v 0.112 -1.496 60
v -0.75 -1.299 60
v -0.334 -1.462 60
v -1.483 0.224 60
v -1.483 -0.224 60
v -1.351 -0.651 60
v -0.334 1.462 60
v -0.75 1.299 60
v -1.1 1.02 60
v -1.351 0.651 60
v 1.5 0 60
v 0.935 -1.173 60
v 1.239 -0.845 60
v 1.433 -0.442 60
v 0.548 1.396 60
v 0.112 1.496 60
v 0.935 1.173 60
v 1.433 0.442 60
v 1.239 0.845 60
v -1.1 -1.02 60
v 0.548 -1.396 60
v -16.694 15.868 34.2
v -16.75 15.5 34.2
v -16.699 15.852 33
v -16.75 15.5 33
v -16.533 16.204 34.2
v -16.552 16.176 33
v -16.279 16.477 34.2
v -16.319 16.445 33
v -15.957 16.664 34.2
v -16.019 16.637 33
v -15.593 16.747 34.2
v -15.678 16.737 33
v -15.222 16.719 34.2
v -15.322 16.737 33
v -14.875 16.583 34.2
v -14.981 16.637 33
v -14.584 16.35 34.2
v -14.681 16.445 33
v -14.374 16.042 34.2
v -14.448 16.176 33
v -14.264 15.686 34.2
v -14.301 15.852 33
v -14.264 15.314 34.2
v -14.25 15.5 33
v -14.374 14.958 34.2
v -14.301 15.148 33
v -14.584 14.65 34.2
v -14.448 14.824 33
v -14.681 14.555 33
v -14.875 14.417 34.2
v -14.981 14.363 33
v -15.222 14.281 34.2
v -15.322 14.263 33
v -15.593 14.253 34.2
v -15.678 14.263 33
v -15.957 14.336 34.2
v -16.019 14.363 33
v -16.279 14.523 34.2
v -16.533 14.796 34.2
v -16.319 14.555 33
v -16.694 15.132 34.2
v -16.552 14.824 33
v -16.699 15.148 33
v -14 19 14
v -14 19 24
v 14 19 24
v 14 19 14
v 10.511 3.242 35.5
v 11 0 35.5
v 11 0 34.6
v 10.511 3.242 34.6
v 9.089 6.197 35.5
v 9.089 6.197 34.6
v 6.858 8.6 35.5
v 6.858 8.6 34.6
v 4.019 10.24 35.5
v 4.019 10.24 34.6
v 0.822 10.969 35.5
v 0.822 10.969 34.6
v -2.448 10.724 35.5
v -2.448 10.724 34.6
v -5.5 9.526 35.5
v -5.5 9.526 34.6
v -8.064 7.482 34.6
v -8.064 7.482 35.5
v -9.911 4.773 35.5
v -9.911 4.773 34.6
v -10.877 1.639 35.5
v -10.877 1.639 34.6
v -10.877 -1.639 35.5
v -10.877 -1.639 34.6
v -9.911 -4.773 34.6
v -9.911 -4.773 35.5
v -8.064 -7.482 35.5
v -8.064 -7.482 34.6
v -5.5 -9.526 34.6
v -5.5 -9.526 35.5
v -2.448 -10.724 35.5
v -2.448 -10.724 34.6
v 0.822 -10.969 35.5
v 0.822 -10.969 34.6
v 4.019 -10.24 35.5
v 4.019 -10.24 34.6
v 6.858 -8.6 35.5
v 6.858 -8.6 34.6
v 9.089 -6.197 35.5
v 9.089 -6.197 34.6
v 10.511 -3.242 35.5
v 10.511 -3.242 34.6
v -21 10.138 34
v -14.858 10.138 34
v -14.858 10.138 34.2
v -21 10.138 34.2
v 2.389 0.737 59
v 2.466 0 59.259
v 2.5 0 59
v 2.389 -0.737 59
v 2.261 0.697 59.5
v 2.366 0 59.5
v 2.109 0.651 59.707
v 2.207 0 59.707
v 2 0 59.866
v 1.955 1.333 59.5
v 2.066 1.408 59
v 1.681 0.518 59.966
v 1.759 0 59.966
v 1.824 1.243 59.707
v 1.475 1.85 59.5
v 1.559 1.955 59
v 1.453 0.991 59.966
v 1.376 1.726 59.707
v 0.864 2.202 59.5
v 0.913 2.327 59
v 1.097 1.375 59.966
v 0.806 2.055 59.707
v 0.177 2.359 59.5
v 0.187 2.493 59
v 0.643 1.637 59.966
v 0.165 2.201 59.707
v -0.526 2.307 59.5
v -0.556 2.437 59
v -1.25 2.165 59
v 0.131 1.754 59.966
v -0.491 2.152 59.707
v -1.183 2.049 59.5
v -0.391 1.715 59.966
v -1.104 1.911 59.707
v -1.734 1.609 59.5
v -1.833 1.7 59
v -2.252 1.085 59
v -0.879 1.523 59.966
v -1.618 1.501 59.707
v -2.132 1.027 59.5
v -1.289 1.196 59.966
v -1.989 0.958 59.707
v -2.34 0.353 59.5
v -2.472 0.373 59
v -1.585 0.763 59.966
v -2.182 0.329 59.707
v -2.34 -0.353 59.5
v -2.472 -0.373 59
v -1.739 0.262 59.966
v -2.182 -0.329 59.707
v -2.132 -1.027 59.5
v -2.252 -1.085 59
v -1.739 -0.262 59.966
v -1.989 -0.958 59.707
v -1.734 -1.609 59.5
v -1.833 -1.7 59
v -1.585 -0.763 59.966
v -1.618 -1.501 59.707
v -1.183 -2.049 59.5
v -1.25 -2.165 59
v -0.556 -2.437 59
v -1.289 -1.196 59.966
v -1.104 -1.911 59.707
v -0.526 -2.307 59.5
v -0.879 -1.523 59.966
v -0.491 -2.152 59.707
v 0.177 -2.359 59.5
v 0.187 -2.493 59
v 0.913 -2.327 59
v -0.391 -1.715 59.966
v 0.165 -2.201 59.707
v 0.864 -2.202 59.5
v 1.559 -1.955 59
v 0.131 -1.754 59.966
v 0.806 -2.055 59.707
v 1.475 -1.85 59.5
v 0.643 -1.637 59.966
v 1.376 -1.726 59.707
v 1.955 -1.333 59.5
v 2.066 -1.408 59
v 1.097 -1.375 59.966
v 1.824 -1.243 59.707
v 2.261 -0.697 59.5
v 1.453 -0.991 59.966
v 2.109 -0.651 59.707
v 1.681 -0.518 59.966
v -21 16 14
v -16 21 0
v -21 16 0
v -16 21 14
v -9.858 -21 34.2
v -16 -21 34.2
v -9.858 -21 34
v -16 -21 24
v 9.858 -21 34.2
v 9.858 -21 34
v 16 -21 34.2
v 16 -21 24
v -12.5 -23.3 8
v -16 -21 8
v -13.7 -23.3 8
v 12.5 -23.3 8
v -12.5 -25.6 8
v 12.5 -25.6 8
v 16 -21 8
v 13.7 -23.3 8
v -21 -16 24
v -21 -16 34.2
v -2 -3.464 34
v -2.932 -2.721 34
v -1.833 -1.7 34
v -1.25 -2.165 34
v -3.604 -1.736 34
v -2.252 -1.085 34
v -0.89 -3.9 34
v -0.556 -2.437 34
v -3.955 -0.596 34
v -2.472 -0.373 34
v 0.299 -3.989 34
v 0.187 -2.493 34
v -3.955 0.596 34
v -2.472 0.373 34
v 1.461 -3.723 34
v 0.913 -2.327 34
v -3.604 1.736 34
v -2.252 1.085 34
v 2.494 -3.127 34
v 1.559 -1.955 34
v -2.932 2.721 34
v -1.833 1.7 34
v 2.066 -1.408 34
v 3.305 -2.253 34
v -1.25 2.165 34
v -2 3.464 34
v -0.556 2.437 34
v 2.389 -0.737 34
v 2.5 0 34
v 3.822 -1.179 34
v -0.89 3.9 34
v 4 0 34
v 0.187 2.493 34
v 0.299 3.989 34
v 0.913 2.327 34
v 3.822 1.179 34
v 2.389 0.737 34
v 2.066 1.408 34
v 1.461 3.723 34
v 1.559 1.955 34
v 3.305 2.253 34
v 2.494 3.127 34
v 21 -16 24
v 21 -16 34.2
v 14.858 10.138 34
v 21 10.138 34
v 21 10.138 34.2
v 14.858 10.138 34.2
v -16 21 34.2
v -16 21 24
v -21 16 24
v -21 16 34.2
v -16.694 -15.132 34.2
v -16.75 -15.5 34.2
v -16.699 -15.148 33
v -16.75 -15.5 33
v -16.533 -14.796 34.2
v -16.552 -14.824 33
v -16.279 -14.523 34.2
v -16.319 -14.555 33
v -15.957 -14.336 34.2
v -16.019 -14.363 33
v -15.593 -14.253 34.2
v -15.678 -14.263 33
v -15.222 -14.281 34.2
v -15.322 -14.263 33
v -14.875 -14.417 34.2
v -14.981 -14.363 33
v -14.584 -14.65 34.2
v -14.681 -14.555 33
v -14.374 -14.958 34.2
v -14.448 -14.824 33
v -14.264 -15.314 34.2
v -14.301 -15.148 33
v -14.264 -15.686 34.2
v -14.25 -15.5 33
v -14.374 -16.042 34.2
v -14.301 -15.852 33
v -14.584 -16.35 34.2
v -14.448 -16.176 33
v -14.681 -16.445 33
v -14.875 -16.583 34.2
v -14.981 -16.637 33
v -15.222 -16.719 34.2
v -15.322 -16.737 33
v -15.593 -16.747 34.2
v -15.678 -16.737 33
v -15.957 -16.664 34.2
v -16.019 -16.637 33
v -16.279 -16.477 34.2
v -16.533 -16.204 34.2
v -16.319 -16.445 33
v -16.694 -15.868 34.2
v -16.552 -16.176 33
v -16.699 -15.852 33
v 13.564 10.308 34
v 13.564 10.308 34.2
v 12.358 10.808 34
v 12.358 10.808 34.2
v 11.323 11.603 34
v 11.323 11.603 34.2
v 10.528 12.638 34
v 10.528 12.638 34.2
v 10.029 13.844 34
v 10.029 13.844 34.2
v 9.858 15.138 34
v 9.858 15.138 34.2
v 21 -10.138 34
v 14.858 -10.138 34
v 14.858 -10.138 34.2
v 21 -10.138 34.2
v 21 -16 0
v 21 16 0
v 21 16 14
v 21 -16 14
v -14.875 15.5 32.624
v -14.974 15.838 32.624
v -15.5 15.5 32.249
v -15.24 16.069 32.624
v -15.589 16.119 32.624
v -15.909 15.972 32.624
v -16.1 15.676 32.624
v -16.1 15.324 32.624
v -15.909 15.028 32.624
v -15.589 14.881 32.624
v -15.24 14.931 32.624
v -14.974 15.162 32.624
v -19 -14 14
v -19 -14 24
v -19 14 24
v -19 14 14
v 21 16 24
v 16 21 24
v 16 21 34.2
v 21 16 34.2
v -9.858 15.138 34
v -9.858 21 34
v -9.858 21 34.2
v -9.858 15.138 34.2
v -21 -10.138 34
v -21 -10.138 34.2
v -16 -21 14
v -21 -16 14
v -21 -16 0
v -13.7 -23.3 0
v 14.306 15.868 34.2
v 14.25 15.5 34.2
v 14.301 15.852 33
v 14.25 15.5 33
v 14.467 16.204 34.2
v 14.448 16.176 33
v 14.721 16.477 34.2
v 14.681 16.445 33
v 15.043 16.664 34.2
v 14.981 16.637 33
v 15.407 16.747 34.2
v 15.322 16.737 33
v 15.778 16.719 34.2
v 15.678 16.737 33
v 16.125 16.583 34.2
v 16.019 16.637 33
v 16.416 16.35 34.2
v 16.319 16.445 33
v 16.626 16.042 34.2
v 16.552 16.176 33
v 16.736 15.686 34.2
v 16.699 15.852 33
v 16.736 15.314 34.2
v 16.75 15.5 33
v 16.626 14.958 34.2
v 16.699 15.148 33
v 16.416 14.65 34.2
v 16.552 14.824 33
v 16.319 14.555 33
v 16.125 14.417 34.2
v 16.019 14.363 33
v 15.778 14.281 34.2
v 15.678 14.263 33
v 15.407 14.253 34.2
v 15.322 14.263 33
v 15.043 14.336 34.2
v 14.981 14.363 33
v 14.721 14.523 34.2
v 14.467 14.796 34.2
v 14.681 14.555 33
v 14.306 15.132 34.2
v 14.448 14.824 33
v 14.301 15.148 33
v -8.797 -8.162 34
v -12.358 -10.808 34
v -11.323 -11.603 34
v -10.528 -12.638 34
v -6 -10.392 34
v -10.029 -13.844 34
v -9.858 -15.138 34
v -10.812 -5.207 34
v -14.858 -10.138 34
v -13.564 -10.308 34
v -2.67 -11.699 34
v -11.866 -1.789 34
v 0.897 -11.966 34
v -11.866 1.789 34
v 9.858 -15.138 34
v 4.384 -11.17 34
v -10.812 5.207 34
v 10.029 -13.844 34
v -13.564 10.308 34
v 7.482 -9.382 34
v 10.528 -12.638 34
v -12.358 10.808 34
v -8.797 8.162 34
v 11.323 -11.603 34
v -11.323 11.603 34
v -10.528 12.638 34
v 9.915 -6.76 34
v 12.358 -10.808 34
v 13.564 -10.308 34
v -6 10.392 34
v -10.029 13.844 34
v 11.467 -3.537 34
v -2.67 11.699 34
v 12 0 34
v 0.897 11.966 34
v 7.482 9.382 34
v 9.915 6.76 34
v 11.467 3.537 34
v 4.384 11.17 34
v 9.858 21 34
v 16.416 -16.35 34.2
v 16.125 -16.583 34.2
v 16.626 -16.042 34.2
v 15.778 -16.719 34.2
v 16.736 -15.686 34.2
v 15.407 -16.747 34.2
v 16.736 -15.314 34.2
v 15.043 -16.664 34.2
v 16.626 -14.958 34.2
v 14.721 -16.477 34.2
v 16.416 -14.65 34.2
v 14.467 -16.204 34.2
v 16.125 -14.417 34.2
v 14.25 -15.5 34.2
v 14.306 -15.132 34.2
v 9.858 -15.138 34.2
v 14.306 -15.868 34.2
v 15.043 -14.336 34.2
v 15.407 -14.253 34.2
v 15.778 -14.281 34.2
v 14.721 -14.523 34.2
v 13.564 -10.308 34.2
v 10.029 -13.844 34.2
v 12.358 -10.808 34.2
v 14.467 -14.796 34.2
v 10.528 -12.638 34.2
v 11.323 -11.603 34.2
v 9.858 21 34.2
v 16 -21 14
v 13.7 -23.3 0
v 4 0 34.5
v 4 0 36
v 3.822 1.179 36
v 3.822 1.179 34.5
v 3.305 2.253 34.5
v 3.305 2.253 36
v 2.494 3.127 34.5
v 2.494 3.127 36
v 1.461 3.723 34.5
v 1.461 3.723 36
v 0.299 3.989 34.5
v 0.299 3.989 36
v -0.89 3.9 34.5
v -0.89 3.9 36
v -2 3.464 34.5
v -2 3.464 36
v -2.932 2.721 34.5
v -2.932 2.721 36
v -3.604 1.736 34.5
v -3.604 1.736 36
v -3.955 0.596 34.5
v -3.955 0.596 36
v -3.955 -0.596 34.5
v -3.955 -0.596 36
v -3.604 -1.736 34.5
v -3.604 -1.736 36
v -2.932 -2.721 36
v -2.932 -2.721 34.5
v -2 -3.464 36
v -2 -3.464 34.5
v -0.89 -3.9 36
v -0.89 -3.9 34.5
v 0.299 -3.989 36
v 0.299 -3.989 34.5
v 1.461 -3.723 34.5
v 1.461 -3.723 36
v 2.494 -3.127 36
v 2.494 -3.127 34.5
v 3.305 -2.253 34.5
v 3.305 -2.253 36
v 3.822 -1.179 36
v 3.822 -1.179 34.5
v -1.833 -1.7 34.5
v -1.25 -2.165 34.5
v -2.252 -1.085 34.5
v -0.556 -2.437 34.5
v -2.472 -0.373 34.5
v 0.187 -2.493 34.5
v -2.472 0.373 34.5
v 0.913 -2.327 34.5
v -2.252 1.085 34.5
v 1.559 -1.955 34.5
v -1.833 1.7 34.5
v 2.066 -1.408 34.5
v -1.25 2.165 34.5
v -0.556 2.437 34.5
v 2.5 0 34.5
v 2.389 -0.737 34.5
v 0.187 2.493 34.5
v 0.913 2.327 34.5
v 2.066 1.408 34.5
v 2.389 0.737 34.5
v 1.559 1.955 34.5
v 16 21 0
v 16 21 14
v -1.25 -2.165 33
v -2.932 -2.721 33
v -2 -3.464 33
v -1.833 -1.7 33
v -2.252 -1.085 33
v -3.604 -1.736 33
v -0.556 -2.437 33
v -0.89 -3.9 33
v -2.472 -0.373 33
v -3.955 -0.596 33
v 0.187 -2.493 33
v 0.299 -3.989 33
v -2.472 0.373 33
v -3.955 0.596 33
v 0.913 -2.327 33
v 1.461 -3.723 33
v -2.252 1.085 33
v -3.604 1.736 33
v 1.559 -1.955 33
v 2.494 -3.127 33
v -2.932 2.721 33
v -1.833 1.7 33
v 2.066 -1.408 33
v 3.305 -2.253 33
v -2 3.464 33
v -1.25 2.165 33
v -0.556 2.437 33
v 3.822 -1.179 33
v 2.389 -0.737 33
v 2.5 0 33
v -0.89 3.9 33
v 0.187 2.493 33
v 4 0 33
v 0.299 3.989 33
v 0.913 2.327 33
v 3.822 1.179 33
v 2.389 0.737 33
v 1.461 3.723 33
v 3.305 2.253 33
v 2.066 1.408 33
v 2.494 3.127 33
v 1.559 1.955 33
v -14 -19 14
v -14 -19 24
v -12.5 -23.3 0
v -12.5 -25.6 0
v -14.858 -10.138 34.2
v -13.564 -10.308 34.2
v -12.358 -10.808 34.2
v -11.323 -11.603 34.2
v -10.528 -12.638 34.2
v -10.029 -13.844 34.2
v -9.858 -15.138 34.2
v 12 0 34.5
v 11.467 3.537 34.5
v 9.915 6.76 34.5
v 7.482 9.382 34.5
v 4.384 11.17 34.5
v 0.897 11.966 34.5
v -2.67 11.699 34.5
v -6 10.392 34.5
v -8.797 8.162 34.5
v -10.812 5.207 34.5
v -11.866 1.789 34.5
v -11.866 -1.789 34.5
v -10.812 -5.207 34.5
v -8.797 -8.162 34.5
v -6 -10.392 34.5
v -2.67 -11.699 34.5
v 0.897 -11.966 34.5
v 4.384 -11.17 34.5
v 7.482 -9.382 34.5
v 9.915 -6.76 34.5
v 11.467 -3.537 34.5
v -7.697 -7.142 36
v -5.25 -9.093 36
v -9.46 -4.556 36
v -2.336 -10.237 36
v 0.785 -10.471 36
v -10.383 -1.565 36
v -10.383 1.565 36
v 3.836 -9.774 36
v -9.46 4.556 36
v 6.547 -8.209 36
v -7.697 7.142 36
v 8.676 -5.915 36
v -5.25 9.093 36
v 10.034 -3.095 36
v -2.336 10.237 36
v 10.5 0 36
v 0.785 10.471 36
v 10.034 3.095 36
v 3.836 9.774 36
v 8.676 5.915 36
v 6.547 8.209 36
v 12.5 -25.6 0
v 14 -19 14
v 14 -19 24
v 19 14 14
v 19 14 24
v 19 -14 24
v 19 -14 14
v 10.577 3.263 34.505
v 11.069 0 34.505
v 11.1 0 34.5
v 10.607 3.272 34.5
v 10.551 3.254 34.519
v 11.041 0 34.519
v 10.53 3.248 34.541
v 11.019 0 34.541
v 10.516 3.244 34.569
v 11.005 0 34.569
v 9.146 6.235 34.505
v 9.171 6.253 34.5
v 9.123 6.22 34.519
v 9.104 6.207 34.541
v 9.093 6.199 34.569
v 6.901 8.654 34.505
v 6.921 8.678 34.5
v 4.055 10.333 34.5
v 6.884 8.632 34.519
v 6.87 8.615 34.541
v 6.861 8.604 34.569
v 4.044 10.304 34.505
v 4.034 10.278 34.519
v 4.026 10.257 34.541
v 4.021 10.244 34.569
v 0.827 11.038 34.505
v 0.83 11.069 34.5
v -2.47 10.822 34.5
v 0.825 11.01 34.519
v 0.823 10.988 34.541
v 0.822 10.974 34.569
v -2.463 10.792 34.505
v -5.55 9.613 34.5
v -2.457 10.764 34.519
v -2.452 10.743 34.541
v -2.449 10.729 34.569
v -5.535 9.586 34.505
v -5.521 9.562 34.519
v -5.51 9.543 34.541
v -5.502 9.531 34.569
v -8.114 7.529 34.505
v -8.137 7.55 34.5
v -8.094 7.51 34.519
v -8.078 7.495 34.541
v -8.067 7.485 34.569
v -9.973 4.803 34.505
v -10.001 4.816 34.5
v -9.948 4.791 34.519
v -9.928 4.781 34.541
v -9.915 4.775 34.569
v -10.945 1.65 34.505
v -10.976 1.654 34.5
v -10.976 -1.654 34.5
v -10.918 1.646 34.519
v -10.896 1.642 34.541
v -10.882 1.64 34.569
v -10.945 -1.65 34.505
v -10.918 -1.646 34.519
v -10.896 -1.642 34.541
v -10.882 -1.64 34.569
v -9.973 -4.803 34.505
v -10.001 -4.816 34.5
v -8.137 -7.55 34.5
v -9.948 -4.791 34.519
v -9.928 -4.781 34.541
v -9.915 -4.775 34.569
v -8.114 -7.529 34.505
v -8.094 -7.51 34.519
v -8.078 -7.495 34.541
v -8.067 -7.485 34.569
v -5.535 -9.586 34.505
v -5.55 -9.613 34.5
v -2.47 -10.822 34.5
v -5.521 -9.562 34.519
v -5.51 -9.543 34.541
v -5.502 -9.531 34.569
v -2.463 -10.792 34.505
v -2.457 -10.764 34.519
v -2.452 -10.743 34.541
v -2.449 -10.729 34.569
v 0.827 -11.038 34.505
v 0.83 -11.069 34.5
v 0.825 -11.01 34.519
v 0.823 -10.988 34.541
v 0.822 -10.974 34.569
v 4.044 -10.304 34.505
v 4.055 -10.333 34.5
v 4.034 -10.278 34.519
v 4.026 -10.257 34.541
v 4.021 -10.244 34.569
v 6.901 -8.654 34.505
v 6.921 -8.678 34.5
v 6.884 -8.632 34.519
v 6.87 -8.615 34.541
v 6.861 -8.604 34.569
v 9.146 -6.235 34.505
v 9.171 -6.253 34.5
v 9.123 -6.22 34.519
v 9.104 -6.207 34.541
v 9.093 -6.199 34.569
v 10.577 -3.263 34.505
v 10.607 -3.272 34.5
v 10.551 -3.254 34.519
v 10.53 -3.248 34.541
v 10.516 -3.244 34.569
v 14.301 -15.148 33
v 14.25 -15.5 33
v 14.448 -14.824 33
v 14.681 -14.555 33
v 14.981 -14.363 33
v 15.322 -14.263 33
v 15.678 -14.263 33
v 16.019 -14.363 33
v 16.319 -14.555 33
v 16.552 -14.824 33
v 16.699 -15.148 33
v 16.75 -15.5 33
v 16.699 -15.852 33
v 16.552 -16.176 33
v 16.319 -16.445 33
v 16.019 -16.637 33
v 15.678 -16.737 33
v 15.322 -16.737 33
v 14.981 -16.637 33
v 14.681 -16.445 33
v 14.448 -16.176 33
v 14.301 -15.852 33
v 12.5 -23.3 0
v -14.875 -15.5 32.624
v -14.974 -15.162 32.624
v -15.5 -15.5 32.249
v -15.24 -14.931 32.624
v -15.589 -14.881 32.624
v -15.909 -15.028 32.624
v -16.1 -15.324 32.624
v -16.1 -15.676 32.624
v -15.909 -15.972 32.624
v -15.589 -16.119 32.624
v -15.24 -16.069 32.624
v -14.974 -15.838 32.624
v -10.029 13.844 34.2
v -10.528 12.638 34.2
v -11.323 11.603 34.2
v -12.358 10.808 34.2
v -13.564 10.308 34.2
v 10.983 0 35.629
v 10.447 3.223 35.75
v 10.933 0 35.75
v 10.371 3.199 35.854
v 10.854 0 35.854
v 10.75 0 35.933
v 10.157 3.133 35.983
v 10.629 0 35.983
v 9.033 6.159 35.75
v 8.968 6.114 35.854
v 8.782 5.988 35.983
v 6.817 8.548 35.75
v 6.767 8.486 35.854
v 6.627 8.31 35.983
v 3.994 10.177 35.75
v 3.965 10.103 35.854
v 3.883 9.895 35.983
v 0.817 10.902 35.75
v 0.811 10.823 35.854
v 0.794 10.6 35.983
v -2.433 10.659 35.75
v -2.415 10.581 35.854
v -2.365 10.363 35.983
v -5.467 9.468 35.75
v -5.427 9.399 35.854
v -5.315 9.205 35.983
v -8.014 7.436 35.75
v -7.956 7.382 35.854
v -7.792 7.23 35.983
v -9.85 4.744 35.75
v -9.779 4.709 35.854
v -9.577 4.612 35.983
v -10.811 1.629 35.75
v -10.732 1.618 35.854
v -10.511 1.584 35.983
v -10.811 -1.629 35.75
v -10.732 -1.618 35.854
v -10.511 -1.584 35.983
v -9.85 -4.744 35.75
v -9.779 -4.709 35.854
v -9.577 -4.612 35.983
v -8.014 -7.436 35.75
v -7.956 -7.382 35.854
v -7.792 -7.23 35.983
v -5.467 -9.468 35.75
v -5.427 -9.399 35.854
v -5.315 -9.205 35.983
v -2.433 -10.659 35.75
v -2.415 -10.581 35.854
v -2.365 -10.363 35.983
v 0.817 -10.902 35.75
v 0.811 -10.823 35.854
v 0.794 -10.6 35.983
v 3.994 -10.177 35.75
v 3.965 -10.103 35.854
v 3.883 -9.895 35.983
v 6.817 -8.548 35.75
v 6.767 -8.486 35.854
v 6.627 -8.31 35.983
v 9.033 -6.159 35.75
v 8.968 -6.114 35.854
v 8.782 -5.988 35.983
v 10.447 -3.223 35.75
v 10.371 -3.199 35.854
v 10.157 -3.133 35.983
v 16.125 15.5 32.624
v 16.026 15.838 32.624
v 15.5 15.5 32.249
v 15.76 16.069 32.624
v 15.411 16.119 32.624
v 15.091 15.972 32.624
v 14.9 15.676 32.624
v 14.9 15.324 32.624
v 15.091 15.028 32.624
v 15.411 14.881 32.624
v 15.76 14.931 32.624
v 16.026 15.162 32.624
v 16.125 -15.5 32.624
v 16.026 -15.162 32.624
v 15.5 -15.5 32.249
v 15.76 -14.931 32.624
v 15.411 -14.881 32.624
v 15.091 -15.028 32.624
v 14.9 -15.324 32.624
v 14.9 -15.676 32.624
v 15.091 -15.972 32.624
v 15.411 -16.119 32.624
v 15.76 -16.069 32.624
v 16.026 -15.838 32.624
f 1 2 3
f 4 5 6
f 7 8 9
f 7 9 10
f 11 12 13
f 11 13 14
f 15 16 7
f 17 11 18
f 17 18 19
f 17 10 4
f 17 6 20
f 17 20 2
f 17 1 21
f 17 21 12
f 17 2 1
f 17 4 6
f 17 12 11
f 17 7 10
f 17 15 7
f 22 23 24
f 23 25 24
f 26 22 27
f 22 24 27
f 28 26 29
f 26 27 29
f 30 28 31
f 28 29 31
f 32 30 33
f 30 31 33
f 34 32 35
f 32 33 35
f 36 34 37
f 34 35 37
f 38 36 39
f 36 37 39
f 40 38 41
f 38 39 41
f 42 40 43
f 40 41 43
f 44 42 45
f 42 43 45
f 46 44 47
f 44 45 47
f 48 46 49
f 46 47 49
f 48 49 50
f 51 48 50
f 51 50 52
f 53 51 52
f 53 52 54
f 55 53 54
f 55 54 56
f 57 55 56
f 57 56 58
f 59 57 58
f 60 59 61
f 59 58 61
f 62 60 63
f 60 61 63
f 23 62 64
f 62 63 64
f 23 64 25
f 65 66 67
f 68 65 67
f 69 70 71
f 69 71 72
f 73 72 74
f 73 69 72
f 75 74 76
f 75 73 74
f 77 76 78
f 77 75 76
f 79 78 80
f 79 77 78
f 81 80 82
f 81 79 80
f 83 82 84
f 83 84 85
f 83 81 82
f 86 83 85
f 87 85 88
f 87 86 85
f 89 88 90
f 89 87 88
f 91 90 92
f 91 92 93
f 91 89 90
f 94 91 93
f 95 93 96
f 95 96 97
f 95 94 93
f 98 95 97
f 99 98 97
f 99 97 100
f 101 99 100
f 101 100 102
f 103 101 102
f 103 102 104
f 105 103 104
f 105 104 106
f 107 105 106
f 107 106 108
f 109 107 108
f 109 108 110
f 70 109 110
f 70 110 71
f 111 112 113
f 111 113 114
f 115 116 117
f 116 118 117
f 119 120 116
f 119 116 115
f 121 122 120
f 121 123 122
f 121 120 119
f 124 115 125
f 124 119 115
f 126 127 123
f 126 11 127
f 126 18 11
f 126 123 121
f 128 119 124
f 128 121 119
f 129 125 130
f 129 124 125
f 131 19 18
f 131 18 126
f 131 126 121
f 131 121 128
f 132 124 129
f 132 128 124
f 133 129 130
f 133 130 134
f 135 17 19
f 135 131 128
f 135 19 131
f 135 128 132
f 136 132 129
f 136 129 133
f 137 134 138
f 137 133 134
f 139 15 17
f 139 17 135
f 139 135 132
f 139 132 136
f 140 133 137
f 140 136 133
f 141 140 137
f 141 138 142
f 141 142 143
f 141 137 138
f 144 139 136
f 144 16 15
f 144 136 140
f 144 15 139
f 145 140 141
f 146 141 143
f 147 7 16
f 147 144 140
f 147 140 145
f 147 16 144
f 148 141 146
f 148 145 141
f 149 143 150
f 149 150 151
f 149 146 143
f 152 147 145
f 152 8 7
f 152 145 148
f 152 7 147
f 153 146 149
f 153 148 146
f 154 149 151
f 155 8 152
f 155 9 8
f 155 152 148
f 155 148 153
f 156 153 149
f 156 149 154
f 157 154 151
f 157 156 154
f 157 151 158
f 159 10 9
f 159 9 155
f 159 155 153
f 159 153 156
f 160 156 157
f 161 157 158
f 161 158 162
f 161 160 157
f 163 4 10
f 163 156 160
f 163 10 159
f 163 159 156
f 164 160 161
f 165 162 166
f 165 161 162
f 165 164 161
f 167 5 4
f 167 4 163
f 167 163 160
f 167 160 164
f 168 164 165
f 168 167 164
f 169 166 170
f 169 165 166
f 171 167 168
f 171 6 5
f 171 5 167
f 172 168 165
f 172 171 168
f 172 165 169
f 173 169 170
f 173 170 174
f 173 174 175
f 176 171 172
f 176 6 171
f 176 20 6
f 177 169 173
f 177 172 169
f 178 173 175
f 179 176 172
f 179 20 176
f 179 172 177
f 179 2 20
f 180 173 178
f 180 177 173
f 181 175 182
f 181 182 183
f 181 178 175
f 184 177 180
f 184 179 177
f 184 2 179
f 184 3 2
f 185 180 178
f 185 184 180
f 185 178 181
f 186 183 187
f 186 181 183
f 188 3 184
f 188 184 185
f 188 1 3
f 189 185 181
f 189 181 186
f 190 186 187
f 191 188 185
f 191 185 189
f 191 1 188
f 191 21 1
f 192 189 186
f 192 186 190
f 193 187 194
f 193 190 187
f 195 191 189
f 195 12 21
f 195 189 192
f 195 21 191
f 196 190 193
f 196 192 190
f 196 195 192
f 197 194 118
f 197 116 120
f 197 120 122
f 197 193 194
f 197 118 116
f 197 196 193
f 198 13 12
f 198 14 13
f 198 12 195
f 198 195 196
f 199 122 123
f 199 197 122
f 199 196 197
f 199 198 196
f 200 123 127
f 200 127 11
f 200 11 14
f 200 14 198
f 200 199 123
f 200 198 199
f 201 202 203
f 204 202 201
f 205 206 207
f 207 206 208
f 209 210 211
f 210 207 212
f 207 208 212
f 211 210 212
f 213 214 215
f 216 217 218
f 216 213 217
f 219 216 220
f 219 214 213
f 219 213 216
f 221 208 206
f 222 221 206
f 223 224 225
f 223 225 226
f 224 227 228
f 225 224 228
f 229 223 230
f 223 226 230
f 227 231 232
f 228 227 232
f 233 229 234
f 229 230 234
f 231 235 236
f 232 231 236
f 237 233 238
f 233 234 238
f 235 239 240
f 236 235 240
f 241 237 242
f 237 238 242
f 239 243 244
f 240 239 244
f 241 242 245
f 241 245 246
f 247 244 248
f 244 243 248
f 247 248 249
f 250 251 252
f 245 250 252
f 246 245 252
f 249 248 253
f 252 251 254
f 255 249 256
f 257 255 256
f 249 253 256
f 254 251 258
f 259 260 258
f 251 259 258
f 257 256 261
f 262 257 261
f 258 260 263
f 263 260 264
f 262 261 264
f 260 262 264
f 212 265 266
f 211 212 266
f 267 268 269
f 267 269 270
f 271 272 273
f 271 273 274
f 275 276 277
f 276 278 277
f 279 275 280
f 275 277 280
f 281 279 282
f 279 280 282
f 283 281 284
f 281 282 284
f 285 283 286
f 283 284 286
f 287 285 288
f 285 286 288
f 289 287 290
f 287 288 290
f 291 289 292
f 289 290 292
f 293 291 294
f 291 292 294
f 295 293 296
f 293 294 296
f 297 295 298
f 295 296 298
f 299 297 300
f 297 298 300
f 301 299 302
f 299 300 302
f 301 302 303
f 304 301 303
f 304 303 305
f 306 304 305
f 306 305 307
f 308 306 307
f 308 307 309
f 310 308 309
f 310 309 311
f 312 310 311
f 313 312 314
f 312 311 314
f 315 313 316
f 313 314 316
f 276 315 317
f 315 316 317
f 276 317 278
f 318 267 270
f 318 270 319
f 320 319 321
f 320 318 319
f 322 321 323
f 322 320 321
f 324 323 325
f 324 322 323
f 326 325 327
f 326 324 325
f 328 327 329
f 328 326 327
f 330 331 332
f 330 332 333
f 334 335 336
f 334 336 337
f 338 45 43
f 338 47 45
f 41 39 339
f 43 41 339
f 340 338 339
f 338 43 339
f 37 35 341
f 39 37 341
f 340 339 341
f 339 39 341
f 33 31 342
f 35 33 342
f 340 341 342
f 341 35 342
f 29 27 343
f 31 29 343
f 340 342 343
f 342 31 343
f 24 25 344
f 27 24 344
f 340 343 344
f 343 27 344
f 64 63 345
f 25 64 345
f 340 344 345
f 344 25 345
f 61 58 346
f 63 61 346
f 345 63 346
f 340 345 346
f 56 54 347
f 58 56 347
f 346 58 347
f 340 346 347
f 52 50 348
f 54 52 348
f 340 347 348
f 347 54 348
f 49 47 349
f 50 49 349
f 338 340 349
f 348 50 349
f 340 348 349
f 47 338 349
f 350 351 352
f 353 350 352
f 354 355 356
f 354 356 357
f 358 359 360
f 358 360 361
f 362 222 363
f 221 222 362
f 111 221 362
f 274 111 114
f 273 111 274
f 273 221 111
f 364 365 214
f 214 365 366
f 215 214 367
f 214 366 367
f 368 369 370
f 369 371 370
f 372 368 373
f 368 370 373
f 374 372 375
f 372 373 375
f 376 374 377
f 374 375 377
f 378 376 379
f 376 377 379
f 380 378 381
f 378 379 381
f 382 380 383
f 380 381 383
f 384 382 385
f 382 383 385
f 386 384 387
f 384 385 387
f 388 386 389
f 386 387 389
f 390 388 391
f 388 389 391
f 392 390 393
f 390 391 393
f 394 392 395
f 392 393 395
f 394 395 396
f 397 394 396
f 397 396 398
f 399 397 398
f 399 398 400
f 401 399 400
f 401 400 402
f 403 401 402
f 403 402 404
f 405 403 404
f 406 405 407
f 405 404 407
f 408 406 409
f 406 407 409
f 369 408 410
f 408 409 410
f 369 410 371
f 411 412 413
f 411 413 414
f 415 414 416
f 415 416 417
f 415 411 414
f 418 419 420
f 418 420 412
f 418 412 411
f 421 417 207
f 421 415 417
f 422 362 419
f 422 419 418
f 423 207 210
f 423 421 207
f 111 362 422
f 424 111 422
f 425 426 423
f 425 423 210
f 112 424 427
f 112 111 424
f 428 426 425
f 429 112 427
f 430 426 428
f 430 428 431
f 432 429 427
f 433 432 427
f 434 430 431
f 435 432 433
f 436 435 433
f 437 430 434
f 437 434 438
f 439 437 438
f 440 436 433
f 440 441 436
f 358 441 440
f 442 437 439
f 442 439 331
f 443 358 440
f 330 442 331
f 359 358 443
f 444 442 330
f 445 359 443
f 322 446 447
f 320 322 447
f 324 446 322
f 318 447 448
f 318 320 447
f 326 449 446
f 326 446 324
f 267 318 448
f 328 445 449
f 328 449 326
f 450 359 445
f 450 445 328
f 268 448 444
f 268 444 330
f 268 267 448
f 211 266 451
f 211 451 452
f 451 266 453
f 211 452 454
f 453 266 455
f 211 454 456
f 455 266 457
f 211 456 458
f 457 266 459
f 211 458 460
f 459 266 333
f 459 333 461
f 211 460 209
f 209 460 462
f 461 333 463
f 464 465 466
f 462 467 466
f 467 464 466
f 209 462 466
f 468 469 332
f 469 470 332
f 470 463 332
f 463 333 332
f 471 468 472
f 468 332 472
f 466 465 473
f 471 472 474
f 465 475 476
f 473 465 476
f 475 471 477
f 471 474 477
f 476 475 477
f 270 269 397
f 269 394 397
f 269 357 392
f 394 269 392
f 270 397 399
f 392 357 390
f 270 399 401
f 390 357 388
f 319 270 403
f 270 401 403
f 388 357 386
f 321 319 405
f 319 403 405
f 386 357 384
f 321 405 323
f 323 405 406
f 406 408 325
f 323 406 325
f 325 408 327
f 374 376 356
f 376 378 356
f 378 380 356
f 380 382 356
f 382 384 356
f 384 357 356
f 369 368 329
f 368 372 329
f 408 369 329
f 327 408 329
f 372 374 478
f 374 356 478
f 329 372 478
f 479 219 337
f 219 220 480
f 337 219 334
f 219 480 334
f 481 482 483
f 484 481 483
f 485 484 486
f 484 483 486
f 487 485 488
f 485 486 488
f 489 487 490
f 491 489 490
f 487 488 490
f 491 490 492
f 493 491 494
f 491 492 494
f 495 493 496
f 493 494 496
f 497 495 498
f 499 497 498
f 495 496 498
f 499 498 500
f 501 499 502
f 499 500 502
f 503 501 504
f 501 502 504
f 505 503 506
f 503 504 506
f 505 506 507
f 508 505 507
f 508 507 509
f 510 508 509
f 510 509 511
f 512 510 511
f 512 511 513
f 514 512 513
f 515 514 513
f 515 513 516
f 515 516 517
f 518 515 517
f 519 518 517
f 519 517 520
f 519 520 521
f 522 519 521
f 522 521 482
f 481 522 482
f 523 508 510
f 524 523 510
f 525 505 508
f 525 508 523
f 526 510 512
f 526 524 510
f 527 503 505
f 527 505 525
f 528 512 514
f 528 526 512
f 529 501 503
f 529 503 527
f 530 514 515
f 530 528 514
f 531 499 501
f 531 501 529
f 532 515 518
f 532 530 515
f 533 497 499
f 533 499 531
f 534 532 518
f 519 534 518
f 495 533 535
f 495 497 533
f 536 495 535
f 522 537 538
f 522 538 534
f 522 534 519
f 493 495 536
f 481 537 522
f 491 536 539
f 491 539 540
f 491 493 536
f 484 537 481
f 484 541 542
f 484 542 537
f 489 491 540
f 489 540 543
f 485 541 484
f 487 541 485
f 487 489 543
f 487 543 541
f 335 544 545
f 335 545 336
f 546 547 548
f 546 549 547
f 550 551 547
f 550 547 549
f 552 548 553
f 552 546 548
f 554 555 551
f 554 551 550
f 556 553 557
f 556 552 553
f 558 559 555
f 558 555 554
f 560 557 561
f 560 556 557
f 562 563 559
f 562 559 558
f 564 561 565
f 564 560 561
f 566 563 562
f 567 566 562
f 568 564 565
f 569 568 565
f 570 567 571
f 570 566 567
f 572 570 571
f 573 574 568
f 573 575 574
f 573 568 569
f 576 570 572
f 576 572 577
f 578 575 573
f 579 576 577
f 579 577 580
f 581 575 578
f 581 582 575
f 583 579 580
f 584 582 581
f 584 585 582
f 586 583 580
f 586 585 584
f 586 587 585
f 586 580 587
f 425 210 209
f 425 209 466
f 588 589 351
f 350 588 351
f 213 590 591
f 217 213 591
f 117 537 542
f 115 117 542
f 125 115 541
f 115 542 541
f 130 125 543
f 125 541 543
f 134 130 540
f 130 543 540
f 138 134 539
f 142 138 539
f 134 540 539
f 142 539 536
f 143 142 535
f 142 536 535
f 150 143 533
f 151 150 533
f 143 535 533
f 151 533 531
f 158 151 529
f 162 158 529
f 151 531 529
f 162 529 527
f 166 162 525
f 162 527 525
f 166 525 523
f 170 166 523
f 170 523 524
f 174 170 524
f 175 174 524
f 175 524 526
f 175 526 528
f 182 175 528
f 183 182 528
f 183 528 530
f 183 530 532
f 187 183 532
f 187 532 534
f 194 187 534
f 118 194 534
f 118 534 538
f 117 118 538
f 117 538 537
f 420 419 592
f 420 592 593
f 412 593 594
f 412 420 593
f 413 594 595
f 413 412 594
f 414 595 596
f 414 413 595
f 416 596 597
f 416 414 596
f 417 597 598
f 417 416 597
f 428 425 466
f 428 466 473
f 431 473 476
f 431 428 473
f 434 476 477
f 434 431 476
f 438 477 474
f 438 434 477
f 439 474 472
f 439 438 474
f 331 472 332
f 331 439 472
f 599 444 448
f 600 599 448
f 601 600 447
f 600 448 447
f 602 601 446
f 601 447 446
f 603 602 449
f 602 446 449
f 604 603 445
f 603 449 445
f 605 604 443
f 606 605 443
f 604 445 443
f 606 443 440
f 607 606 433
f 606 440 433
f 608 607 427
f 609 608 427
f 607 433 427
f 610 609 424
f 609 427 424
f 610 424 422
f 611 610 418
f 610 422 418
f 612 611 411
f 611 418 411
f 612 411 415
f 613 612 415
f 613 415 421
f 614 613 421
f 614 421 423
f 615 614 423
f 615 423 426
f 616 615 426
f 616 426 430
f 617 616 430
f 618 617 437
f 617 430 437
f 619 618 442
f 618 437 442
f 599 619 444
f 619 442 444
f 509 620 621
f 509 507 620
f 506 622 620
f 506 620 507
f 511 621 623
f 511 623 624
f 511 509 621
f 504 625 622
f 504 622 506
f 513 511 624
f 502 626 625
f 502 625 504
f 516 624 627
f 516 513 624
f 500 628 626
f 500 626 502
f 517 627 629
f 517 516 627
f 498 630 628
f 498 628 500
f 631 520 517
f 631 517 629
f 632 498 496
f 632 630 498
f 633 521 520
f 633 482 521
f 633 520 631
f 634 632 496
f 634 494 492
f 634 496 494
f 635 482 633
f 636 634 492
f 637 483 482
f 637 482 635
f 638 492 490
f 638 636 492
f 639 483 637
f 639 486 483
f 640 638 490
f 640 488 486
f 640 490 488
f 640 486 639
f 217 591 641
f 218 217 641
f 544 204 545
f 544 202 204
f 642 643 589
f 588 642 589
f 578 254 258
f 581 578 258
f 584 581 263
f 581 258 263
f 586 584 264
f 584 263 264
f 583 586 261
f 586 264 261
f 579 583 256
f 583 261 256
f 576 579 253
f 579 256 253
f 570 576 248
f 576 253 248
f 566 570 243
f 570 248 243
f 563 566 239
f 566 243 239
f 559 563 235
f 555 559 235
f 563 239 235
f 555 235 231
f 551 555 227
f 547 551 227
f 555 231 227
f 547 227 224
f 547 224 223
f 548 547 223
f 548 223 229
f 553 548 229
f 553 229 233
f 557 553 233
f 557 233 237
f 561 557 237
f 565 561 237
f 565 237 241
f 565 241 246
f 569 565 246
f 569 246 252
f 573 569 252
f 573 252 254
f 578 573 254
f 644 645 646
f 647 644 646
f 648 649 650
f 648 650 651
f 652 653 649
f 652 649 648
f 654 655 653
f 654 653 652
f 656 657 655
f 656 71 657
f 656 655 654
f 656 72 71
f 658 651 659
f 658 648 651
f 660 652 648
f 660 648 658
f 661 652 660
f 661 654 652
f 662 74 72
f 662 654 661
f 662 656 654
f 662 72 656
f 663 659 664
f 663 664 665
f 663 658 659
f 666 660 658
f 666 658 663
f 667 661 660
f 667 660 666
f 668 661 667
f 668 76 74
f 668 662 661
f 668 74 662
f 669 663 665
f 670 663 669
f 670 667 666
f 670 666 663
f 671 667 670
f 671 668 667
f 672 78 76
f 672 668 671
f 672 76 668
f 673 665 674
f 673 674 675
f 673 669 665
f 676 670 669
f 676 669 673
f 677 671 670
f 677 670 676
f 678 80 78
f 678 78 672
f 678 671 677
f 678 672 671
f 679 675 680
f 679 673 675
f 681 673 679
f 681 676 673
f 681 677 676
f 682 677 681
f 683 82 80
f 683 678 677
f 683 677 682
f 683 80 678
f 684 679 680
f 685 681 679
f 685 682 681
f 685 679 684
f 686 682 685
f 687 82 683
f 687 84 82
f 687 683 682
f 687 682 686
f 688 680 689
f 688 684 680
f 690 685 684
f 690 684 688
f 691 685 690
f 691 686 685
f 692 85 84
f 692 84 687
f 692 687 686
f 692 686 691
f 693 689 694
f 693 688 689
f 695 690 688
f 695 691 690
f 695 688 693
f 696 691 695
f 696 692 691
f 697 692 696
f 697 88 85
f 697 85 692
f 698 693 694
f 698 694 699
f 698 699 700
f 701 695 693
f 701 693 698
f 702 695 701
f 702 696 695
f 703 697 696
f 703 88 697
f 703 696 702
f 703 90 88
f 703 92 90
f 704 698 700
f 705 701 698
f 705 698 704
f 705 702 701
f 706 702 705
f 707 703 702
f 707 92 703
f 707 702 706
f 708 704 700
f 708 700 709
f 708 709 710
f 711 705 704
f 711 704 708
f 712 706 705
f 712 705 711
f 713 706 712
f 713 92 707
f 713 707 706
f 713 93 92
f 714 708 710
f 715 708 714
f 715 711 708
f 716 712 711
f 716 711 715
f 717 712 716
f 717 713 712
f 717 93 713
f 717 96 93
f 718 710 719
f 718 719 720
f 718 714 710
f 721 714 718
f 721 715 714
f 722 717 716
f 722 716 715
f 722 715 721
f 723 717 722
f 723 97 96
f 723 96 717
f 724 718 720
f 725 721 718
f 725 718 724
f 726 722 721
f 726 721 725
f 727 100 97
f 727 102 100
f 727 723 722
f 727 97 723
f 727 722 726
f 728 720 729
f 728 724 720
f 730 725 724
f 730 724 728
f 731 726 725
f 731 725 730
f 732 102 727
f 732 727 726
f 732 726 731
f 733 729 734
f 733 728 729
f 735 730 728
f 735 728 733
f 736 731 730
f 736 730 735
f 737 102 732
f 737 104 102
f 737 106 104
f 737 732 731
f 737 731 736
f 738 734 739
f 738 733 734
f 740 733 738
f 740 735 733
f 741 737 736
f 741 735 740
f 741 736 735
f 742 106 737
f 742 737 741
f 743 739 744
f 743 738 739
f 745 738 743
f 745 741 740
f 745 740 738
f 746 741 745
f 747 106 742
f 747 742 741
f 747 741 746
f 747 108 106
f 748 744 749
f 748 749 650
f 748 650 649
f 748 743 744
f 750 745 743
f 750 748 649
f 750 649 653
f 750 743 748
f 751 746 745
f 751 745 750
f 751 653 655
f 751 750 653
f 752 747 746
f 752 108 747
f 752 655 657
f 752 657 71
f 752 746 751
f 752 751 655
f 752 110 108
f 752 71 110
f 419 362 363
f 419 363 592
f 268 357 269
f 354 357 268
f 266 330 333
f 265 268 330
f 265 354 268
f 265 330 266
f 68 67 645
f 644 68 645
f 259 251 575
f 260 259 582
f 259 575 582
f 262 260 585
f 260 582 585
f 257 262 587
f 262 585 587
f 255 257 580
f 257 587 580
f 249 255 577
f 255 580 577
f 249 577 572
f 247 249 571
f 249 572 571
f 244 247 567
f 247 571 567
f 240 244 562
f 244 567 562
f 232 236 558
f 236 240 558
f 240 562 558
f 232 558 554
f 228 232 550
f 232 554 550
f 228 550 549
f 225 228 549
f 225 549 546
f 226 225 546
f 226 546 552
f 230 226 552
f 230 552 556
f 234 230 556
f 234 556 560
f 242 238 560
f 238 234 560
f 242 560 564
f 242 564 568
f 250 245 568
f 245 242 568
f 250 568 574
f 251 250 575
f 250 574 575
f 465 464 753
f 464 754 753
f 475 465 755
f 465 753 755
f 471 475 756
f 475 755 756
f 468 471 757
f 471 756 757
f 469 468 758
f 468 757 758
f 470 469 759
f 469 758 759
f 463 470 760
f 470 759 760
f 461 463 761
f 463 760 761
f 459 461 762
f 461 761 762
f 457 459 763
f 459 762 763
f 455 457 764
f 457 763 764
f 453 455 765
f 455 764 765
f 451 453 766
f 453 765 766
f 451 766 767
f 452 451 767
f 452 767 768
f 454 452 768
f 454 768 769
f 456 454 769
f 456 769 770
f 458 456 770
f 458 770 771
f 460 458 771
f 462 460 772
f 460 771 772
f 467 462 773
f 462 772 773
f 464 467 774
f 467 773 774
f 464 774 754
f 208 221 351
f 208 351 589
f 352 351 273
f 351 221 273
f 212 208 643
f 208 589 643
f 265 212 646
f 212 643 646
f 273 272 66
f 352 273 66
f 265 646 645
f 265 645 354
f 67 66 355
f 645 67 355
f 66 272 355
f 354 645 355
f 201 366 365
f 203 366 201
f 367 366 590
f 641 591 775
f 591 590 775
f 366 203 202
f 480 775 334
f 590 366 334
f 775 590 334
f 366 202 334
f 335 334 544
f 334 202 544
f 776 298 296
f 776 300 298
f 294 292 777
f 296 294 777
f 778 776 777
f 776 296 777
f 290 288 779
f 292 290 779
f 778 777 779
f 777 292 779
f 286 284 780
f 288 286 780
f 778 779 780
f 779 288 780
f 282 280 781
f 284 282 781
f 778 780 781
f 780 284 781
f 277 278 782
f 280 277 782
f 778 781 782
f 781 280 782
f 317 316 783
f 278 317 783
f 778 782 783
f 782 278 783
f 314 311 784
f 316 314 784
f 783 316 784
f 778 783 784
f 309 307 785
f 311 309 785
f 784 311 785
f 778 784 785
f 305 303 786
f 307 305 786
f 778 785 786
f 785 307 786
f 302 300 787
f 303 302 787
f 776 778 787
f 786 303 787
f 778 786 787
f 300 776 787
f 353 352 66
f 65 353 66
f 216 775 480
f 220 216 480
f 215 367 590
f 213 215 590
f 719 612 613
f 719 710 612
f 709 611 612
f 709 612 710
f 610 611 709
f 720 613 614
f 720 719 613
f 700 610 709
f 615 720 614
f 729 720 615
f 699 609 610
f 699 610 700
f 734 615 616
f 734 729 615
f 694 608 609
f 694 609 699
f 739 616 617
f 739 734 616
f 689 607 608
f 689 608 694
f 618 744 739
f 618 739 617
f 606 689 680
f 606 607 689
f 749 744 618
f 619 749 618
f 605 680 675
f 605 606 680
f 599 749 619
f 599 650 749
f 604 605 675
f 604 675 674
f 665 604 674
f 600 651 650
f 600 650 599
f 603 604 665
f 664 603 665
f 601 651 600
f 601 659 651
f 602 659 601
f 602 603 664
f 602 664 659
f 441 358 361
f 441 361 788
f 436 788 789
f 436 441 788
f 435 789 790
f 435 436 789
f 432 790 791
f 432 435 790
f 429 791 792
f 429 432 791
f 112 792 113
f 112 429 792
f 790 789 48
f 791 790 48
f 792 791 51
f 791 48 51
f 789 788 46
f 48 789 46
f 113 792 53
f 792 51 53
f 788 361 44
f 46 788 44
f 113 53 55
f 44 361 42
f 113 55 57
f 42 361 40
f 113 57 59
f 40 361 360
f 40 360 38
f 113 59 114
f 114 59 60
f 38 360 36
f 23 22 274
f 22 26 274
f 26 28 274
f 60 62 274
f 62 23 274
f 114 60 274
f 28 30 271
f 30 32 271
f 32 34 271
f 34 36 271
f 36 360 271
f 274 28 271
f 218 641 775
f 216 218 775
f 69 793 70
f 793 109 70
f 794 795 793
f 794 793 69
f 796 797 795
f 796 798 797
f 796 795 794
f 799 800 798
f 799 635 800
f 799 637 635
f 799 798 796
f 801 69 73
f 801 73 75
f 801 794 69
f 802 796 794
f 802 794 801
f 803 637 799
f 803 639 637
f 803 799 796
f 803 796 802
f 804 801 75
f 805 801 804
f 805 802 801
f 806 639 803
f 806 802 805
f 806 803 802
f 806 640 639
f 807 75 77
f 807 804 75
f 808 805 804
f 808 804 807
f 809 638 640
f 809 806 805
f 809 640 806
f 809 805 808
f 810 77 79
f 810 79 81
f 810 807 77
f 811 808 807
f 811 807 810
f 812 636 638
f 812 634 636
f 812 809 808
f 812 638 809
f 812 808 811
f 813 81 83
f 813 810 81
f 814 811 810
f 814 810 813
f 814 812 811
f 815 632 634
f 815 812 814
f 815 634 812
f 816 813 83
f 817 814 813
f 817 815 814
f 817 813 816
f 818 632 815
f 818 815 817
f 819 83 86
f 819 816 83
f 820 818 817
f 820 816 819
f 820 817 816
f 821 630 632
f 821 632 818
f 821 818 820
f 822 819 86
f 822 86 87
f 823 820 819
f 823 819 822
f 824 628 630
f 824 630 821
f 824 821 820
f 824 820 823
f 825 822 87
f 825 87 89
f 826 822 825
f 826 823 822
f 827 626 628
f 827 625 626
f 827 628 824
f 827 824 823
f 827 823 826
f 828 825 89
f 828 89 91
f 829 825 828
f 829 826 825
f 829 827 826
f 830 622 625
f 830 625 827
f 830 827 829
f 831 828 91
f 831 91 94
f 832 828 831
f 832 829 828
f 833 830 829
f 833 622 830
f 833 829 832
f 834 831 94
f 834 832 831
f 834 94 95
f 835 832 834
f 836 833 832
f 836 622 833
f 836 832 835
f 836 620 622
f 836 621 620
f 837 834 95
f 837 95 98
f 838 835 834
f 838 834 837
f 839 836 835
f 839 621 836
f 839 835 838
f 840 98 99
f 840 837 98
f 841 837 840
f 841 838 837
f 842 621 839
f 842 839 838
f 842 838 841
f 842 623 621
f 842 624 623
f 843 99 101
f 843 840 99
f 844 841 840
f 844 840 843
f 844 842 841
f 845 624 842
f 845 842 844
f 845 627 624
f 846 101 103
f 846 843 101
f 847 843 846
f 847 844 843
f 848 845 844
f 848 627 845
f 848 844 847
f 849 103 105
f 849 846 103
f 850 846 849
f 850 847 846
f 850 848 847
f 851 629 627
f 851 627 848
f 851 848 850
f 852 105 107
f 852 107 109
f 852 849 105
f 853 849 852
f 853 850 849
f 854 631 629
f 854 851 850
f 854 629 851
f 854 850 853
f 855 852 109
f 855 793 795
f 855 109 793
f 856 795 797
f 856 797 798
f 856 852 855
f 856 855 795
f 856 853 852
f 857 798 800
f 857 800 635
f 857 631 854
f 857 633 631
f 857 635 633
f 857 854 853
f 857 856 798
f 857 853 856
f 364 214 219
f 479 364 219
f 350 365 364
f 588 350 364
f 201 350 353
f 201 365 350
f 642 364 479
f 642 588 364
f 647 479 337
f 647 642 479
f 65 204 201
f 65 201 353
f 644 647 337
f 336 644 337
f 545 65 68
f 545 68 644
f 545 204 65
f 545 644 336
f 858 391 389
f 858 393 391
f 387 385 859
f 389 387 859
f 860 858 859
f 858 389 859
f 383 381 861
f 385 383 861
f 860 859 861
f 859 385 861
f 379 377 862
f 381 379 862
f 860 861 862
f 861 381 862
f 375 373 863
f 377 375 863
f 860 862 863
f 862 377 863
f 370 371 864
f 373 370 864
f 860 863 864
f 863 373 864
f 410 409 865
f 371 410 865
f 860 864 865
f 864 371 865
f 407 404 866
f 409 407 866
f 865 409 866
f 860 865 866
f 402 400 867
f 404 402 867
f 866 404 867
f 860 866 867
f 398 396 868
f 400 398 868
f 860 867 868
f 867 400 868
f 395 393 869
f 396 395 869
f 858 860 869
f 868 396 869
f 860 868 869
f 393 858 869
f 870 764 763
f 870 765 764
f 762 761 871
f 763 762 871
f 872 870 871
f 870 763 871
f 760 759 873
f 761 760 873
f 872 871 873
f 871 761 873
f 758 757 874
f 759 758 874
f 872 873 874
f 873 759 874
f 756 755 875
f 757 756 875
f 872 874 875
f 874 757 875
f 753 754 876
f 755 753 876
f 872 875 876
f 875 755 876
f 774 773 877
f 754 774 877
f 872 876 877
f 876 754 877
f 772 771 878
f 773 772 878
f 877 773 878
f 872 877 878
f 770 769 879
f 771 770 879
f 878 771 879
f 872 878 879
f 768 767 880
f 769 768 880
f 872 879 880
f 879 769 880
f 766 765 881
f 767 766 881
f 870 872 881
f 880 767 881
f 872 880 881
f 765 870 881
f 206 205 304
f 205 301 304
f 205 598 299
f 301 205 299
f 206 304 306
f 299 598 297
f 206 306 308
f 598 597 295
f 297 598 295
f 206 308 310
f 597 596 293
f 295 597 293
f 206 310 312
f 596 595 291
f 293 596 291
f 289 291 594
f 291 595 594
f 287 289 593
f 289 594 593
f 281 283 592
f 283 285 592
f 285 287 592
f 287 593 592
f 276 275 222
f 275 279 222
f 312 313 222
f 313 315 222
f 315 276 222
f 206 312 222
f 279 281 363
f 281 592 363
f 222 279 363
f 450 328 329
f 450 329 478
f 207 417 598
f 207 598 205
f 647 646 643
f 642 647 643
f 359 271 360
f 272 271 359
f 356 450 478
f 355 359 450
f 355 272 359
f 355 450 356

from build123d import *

# Parameters (mm, degrees)
SKETCH1_W             = 42
SKETCH1_H             = 42
BOSS_EXTRUDE1_DEPTH   = 36
SKETCH2_OUTSIDE_W     = 57.892
SKETCH2_OUTSIDE_H     = 57.892
SKETCH2_OUTSIDE_R     = 11
CUT_EXTRUDE1_DEPTH    = 2
FILLET1_R             = 0.5
SKETCH3_R             = 4
CUT_EXTRUDE2_DEPTH    = 3
SKETCH4_R             = 2.5
BOSS_EXTRUDE2_DEPTH   = 27
FILLET3_R             = 1
SKETCH5_R             = 12
BOSS_EXTRUDE3_DEPTH   = 0.5
FILLET4_R             = 0.1
M3_TAPPED_HOLE1_D     = 2.5
M3_TAPPED_HOLE1_DEPTH = 1
M3_TAPPED_HOLE1_TIP   = 0.751075774
CHAMFER2_SIZE         = 5
BOSS_EXTRUDE4_DEPTH   = 0.2
CUT_EXTRUDE4_START    = -10
CUT_EXTRUDE4_DEPTH    = 10
BOSS_EXTRUDE5_START   = -34.2
BOSS_EXTRUDE5_DEPTH   = 8
M3_TAPPED_HOLE3_D     = 2.5
M3_TAPPED_HOLE3_DEPTH = 1
M3_TAPPED_HOLE3_TIP   = 0.751075774


with BuildPart() as part:
    # Sketch1 → Boss-Extrude1 (new body)
    with BuildSketch(Plane.XY):
        Rectangle(SKETCH1_W, SKETCH1_H)
    extrude(amount=BOSS_EXTRUDE1_DEPTH)

    # Sketch2 outside → Cut-Extrude1 (cut)
    with BuildSketch(Plane.XY.offset(36)):
        Rectangle(SKETCH2_OUTSIDE_W, SKETCH2_OUTSIDE_H)
        Circle(SKETCH2_OUTSIDE_R, mode=Mode.SUBTRACT)
    extrude(amount=-CUT_EXTRUDE1_DEPTH, mode=Mode.SUBTRACT)

    # Fillet1
    fillet1_edges = [part.edges().sort_by_distance(p)[0] for p in [
        (-11, 0, 36),
    ]]
    fillet(fillet1_edges, radius=FILLET1_R)

    # Sketch3 → Cut-Extrude2 (cut)
    with BuildSketch(Plane.XY.offset(36)):
        Circle(SKETCH3_R)
    extrude(amount=-CUT_EXTRUDE2_DEPTH, mode=Mode.SUBTRACT)

    # Sketch4 → Boss-Extrude2 (add)
    with BuildSketch(Plane.XY.offset(33)):
        Circle(SKETCH4_R)
    extrude(amount=BOSS_EXTRUDE2_DEPTH)

    # Fillet3
    fillet3_edges = [part.edges().sort_by_distance(p)[0] for p in [
        (-2.5, 0, 60),
    ]]
    fillet(fillet3_edges, radius=FILLET3_R)

    # Sketch5 → Boss-Extrude3 (add)
    with BuildSketch(Plane.XY.offset(34)):
        Circle(SKETCH5_R)
    extrude(amount=BOSS_EXTRUDE3_DEPTH)

    # Fillet4
    fillet4_edges = [part.edges().sort_by_distance(p)[0] for p in [
        (-11, 0, 34.5),
    ]]
    fillet(fillet4_edges, radius=FILLET4_R)

    # M3 Tapped Hole1
    with Locations(Plane.XY.offset(34)):
        with Locations((15.5, 15.5), (-15.5, 15.5), (15.5, -15.5), (-15.5, -15.5)):
            Hole(M3_TAPPED_HOLE1_D / 2, depth=M3_TAPPED_HOLE1_DEPTH)
            with Locations((0, 0, -(M3_TAPPED_HOLE1_DEPTH + M3_TAPPED_HOLE1_TIP / 2))):  # 118° drill point
                Cone(0, M3_TAPPED_HOLE1_D / 2, M3_TAPPED_HOLE1_TIP, mode=Mode.SUBTRACT)

    # Chamfer2
    chamfer2_edges = [part.edges().sort_by_distance(p)[0] for p in [
        (21, -21, 17),
        (-21, -21, 17),
        (-21, 21, 17),
        (21, 21, 17),
    ]]
    chamfer(chamfer2_edges, length=CHAMFER2_SIZE)

    # Sketch9 → Boss-Extrude4 (add)
    with BuildSketch(Plane.XY.offset(34)):
        with BuildLine():
            Line((16, 21), (21, 16))
            Line((21, 16), (21, 10.138100447))
            Line((21, 10.138100447), (14.858342654, 10.138100447))
            ThreePointArc((14.858342654, 10.138100447), (11.322808748, 11.602566541), (9.858342654, 15.138100447))
            Line((9.858342654, 15.138100447), (9.858342654, 21))
            Line((9.858342654, 21), (16, 21))
        make_face()
        with BuildLine():
            Line((-21, 10.138100447), (-21, 16))
            Line((-21, 16), (-16, 21))
            Line((-16, 21), (-9.858342654, 21))
            Line((-9.858342654, 21), (-9.858342654, 15.138100447))
            ThreePointArc((-9.858342654, 15.138100447), (-11.322808748, 11.602566541), (-14.858342654, 10.138100447))
            Line((-14.858342654, 10.138100447), (-21, 10.138100447))
        make_face()
        with BuildLine():
            Line((-16, -21), (-21, -16))
            Line((-21, -16), (-21, -10.138100447))
            Line((-21, -10.138100447), (-14.858342654, -10.138100447))
            ThreePointArc((-14.858342654, -10.138100447), (-11.322808748, -11.602566541), (-9.858342654, -15.138100447))
            Line((-9.858342654, -15.138100447), (-9.858342654, -21))
            Line((-9.858342654, -21), (-16, -21))
        make_face()
        with BuildLine():
            Line((21, -10.138100447), (21, -16))
            Line((21, -16), (16, -21))
            Line((16, -21), (9.858342654, -21))
            Line((9.858342654, -21), (9.858342654, -15.138100447))
            ThreePointArc((9.858342654, -15.138100447), (11.322808748, -11.602566541), (14.858342654, -10.138100447))
            Line((14.858342654, -10.138100447), (21, -10.138100447))
        make_face()
    extrude(amount=BOSS_EXTRUDE4_DEPTH)

    # Sketch10 → Cut-Extrude4 (cut)
    with BuildSketch(Plane.XY.offset(34).offset(CUT_EXTRUDE4_START)):
        Polygon((21, 16.017915508), (16.017915508, 21), (-15.980285858, 21.03762965), (-21, 16.017915508), (-21, -16.050170564), (-16.050170564, -21), (16.010758898, -21), (21, -16.010758898), align=None)
        Polygon((19, -14), (14, -19), (-14, -19), (-19, -14), (-19, 14), (-14, 19), (14, 19), (19, 14), align=None, mode=Mode.SUBTRACT)
    extrude(amount=-CUT_EXTRUDE4_DEPTH, mode=Mode.SUBTRACT)

    # Sketch13 → Boss-Extrude5 (add)
    with BuildSketch(Plane.XY.offset(34.2).offset(BOSS_EXTRUDE5_START)):
        Polygon((-12.5, -25.6), (12.5, -25.6), (12.5, -23.3), (13.7, -23.3), (16, -21), (12.5, -21), (-12.5, -21), (-16, -21), (-13.7, -23.3), (-12.5, -23.3), align=None)
    extrude(amount=BOSS_EXTRUDE5_DEPTH)

    # M3 Tapped Hole3
    with Locations(Plane.XY.offset(34.2)):
        with Locations((-15.5, 15.5), (15.5, 15.5), (15.5, -15.5), (-15.5, -15.5)):
            Hole(M3_TAPPED_HOLE3_D / 2, depth=M3_TAPPED_HOLE3_DEPTH)
            with Locations((0, 0, -(M3_TAPPED_HOLE3_DEPTH + M3_TAPPED_HOLE3_TIP / 2))):  # 118° drill point
                Cone(0, M3_TAPPED_HOLE3_D / 2, M3_TAPPED_HOLE3_TIP, mode=Mode.SUBTRACT)


solid = part.part
